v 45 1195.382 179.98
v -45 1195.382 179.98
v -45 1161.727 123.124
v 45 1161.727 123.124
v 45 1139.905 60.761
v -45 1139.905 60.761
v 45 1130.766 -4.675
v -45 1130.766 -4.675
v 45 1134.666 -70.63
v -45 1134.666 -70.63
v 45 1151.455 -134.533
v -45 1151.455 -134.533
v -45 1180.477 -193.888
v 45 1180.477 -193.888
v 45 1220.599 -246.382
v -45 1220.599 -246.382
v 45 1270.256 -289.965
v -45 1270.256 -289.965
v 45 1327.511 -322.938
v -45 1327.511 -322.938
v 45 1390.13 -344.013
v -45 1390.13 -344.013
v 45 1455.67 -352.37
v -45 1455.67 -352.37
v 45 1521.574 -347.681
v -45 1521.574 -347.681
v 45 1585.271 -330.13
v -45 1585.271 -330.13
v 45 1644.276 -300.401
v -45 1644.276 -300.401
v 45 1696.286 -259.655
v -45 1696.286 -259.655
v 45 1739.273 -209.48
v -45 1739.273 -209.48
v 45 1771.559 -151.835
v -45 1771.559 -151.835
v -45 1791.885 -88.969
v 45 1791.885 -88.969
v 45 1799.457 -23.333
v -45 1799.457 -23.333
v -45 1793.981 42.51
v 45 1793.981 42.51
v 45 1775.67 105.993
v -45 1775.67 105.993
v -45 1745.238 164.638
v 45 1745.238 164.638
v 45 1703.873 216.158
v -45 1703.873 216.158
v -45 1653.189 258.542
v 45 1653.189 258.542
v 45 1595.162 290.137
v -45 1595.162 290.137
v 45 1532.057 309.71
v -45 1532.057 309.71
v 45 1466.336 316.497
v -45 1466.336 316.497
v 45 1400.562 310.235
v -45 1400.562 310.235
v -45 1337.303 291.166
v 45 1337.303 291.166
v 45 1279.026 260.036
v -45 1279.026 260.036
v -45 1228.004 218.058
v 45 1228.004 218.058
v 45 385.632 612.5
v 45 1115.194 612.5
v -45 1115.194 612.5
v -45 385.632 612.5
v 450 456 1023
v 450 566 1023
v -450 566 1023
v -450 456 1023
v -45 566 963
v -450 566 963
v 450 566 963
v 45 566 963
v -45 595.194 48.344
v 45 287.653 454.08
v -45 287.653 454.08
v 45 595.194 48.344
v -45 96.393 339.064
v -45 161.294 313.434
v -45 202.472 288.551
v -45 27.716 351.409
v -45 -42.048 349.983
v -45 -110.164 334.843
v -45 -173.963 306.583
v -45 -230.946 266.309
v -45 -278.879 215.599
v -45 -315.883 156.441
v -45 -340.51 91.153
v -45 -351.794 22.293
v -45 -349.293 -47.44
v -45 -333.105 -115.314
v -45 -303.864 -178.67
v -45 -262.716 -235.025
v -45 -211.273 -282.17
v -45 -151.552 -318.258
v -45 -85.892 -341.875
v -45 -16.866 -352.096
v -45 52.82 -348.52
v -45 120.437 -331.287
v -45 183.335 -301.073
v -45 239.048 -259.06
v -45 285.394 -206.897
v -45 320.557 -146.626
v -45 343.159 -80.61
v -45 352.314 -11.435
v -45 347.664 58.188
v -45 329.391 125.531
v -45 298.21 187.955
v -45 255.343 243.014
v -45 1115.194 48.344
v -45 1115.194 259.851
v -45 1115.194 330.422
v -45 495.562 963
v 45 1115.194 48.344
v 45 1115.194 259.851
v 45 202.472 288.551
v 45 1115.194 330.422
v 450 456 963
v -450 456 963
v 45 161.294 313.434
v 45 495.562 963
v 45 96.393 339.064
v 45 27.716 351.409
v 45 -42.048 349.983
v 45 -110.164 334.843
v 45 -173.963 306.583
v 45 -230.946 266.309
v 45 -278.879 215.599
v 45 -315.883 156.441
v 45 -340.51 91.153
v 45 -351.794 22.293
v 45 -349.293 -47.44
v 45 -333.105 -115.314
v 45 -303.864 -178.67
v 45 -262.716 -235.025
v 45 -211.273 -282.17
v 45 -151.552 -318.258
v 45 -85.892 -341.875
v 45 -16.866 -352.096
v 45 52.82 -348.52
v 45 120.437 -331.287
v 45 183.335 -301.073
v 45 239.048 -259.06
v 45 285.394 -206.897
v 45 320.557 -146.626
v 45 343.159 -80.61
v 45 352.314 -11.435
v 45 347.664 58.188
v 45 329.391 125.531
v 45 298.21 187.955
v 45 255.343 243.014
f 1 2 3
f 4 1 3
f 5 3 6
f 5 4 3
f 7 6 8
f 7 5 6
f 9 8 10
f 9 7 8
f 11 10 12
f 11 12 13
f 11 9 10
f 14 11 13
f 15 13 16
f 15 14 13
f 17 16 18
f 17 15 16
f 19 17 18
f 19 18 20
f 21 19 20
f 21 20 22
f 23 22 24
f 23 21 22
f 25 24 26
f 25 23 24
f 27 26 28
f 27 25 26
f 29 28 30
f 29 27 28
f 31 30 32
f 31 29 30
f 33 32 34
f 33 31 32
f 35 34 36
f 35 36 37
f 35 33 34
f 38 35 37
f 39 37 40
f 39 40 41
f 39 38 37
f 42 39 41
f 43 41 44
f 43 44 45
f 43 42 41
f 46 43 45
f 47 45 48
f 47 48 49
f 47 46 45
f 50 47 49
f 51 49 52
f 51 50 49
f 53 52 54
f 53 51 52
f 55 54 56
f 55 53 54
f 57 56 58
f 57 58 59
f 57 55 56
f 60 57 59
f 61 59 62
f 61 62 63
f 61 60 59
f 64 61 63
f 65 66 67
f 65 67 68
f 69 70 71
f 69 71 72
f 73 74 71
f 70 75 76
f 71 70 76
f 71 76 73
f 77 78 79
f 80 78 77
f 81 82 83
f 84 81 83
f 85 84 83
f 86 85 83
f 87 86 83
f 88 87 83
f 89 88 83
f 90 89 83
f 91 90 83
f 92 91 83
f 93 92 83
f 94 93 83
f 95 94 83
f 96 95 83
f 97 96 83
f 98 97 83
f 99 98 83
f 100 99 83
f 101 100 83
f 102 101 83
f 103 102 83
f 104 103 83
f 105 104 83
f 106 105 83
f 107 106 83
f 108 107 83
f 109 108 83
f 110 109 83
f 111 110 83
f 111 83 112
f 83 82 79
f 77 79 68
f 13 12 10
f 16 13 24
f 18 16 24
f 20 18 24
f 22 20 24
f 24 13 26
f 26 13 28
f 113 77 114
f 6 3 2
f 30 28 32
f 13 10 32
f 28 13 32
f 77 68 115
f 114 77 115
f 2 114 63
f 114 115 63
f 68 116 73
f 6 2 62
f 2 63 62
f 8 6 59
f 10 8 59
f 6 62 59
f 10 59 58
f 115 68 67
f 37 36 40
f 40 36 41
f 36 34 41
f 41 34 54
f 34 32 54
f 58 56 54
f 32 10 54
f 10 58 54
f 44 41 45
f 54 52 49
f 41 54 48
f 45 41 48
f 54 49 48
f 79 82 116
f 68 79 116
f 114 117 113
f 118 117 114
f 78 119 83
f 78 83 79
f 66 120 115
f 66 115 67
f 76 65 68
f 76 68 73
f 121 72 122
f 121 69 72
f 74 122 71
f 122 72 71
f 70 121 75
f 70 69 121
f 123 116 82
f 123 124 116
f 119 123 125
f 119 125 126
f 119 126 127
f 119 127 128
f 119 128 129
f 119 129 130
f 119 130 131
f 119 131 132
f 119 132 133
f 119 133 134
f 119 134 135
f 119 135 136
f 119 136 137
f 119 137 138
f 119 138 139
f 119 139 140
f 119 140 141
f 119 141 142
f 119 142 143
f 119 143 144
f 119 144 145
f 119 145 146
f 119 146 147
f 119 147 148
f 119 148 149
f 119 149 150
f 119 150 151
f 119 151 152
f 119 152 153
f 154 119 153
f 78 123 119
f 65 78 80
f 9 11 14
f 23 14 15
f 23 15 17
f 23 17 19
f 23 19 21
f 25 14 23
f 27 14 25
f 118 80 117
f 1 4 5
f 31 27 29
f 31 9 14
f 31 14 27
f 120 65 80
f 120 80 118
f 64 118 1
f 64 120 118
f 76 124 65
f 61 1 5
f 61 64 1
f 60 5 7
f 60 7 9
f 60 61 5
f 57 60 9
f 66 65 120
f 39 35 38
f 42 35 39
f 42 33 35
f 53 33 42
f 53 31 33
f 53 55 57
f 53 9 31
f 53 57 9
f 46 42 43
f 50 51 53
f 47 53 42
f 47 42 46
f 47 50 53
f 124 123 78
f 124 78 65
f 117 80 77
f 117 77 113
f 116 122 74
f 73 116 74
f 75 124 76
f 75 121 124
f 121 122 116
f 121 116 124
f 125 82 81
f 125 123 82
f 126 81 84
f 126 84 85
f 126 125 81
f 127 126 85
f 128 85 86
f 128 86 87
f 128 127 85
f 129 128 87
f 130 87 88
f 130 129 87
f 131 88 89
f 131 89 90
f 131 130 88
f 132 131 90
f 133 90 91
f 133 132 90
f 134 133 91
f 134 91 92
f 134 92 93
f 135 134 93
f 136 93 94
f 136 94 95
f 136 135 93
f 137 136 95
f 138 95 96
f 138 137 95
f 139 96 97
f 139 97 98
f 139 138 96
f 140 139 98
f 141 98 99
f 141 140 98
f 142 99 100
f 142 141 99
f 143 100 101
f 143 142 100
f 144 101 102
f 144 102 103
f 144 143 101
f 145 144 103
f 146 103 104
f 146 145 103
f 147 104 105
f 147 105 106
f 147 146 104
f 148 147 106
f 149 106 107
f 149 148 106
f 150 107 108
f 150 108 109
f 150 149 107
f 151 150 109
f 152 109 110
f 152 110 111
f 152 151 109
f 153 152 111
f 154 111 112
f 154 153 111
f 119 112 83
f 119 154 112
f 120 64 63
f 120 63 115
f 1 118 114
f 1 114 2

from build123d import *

# Parameters (mm, degrees)
F1_DEPTH = 45
F2_DEPTH = 450


# Not quite as in the source:
# - a feature names something its author has since deleted; it is built from what else it names


with BuildPart() as f1:
    # F0 (on Right) → F1 (new body, symmetric)
    with BuildSketch(Plane.YZ):
        with BuildLine():
            ThreePointArc((161.2936216865, 313.43359361), (-300.9254489442, -183.5759357262), (352.5, 0))
            ThreePointArc((352.5, 0), (312.7518796274, 162.6115364588), (202.4715643149, 288.5507158956))
            ThreePointArc((202.4715643149, 288.5507158956), (182.3076165098, 301.6955136599), (161.2936216865, 313.43359361))
        make_face()
        with BuildLine():
            ThreePointArc((161.2936216865, 313.43359361), (182.3076165098, 301.6955136599), (202.4715643149, 288.5507158956))
            Line((202.4715643149, 288.5507158956), (287.6534110047, 454.0802144534))
            Line((287.6534110047, 454.0802144534), (255.5, 496.5))
            Line((255.5, 496.5), (161.2936216865, 313.43359361))
        make_face()
        Polygon((255.5, 496.5), (287.6534110047, 454.0802144534), (595.193856999, 48.3441087551), (1115.193856999, 48.3441087551), (1115.193856999, 259.8511291536), (1115.193856999, 330.4220543775), (1115.193856999, 612.5), (385.6319234642, 612.5), (315.193856999, 612.5), align=None)
        Polygon((495.5619335347, 963), (315.193856999, 612.5), (385.6319234642, 612.5), (566, 963), align=None)
        Polygon((456, 963), (495.5619335347, 963), (566, 963), (566, 1023), (456, 1023), align=None)
        with BuildLine():
            Line((1115.193856999, 330.4220543775), (1115.193856999, 259.8511291536))
            Line((1115.193856999, 259.8511291536), (1195.3817888304, 179.9804793552))
            ThreePointArc((1195.3817888304, 179.9804793552), (1210.9786128275, 199.6313048689), (1228.0043825139, 218.0578897059))
            Line((1228.0043825139, 218.0578897059), (1115.193856999, 330.4220543775))
        make_face()
        with BuildLine():
            ThreePointArc((1228.0043825139, 218.0578897059), (1210.9786128275, 199.6313048689), (1195.3817888304, 179.9804793552))
            ThreePointArc((1195.3817888304, 179.9804793552), (1360.8295666617, -335.8659636043), (1799.5, -18))
            ThreePointArc((1799.5, -18), (1592.7012450035, 291.1644255482), (1228.0043825139, 218.0578897059))
        make_face()
    extrude(amount=F1_DEPTH, both=True)

    # F0 (on Right) → F2 (join, symmetric)
    with BuildSketch(Plane.YZ):
        Polygon((456, 963), (495.5619335347, 963), (566, 963), (566, 1023), (456, 1023), align=None)
    extrude(amount=F2_DEPTH, both=True)


solid = f1.part
